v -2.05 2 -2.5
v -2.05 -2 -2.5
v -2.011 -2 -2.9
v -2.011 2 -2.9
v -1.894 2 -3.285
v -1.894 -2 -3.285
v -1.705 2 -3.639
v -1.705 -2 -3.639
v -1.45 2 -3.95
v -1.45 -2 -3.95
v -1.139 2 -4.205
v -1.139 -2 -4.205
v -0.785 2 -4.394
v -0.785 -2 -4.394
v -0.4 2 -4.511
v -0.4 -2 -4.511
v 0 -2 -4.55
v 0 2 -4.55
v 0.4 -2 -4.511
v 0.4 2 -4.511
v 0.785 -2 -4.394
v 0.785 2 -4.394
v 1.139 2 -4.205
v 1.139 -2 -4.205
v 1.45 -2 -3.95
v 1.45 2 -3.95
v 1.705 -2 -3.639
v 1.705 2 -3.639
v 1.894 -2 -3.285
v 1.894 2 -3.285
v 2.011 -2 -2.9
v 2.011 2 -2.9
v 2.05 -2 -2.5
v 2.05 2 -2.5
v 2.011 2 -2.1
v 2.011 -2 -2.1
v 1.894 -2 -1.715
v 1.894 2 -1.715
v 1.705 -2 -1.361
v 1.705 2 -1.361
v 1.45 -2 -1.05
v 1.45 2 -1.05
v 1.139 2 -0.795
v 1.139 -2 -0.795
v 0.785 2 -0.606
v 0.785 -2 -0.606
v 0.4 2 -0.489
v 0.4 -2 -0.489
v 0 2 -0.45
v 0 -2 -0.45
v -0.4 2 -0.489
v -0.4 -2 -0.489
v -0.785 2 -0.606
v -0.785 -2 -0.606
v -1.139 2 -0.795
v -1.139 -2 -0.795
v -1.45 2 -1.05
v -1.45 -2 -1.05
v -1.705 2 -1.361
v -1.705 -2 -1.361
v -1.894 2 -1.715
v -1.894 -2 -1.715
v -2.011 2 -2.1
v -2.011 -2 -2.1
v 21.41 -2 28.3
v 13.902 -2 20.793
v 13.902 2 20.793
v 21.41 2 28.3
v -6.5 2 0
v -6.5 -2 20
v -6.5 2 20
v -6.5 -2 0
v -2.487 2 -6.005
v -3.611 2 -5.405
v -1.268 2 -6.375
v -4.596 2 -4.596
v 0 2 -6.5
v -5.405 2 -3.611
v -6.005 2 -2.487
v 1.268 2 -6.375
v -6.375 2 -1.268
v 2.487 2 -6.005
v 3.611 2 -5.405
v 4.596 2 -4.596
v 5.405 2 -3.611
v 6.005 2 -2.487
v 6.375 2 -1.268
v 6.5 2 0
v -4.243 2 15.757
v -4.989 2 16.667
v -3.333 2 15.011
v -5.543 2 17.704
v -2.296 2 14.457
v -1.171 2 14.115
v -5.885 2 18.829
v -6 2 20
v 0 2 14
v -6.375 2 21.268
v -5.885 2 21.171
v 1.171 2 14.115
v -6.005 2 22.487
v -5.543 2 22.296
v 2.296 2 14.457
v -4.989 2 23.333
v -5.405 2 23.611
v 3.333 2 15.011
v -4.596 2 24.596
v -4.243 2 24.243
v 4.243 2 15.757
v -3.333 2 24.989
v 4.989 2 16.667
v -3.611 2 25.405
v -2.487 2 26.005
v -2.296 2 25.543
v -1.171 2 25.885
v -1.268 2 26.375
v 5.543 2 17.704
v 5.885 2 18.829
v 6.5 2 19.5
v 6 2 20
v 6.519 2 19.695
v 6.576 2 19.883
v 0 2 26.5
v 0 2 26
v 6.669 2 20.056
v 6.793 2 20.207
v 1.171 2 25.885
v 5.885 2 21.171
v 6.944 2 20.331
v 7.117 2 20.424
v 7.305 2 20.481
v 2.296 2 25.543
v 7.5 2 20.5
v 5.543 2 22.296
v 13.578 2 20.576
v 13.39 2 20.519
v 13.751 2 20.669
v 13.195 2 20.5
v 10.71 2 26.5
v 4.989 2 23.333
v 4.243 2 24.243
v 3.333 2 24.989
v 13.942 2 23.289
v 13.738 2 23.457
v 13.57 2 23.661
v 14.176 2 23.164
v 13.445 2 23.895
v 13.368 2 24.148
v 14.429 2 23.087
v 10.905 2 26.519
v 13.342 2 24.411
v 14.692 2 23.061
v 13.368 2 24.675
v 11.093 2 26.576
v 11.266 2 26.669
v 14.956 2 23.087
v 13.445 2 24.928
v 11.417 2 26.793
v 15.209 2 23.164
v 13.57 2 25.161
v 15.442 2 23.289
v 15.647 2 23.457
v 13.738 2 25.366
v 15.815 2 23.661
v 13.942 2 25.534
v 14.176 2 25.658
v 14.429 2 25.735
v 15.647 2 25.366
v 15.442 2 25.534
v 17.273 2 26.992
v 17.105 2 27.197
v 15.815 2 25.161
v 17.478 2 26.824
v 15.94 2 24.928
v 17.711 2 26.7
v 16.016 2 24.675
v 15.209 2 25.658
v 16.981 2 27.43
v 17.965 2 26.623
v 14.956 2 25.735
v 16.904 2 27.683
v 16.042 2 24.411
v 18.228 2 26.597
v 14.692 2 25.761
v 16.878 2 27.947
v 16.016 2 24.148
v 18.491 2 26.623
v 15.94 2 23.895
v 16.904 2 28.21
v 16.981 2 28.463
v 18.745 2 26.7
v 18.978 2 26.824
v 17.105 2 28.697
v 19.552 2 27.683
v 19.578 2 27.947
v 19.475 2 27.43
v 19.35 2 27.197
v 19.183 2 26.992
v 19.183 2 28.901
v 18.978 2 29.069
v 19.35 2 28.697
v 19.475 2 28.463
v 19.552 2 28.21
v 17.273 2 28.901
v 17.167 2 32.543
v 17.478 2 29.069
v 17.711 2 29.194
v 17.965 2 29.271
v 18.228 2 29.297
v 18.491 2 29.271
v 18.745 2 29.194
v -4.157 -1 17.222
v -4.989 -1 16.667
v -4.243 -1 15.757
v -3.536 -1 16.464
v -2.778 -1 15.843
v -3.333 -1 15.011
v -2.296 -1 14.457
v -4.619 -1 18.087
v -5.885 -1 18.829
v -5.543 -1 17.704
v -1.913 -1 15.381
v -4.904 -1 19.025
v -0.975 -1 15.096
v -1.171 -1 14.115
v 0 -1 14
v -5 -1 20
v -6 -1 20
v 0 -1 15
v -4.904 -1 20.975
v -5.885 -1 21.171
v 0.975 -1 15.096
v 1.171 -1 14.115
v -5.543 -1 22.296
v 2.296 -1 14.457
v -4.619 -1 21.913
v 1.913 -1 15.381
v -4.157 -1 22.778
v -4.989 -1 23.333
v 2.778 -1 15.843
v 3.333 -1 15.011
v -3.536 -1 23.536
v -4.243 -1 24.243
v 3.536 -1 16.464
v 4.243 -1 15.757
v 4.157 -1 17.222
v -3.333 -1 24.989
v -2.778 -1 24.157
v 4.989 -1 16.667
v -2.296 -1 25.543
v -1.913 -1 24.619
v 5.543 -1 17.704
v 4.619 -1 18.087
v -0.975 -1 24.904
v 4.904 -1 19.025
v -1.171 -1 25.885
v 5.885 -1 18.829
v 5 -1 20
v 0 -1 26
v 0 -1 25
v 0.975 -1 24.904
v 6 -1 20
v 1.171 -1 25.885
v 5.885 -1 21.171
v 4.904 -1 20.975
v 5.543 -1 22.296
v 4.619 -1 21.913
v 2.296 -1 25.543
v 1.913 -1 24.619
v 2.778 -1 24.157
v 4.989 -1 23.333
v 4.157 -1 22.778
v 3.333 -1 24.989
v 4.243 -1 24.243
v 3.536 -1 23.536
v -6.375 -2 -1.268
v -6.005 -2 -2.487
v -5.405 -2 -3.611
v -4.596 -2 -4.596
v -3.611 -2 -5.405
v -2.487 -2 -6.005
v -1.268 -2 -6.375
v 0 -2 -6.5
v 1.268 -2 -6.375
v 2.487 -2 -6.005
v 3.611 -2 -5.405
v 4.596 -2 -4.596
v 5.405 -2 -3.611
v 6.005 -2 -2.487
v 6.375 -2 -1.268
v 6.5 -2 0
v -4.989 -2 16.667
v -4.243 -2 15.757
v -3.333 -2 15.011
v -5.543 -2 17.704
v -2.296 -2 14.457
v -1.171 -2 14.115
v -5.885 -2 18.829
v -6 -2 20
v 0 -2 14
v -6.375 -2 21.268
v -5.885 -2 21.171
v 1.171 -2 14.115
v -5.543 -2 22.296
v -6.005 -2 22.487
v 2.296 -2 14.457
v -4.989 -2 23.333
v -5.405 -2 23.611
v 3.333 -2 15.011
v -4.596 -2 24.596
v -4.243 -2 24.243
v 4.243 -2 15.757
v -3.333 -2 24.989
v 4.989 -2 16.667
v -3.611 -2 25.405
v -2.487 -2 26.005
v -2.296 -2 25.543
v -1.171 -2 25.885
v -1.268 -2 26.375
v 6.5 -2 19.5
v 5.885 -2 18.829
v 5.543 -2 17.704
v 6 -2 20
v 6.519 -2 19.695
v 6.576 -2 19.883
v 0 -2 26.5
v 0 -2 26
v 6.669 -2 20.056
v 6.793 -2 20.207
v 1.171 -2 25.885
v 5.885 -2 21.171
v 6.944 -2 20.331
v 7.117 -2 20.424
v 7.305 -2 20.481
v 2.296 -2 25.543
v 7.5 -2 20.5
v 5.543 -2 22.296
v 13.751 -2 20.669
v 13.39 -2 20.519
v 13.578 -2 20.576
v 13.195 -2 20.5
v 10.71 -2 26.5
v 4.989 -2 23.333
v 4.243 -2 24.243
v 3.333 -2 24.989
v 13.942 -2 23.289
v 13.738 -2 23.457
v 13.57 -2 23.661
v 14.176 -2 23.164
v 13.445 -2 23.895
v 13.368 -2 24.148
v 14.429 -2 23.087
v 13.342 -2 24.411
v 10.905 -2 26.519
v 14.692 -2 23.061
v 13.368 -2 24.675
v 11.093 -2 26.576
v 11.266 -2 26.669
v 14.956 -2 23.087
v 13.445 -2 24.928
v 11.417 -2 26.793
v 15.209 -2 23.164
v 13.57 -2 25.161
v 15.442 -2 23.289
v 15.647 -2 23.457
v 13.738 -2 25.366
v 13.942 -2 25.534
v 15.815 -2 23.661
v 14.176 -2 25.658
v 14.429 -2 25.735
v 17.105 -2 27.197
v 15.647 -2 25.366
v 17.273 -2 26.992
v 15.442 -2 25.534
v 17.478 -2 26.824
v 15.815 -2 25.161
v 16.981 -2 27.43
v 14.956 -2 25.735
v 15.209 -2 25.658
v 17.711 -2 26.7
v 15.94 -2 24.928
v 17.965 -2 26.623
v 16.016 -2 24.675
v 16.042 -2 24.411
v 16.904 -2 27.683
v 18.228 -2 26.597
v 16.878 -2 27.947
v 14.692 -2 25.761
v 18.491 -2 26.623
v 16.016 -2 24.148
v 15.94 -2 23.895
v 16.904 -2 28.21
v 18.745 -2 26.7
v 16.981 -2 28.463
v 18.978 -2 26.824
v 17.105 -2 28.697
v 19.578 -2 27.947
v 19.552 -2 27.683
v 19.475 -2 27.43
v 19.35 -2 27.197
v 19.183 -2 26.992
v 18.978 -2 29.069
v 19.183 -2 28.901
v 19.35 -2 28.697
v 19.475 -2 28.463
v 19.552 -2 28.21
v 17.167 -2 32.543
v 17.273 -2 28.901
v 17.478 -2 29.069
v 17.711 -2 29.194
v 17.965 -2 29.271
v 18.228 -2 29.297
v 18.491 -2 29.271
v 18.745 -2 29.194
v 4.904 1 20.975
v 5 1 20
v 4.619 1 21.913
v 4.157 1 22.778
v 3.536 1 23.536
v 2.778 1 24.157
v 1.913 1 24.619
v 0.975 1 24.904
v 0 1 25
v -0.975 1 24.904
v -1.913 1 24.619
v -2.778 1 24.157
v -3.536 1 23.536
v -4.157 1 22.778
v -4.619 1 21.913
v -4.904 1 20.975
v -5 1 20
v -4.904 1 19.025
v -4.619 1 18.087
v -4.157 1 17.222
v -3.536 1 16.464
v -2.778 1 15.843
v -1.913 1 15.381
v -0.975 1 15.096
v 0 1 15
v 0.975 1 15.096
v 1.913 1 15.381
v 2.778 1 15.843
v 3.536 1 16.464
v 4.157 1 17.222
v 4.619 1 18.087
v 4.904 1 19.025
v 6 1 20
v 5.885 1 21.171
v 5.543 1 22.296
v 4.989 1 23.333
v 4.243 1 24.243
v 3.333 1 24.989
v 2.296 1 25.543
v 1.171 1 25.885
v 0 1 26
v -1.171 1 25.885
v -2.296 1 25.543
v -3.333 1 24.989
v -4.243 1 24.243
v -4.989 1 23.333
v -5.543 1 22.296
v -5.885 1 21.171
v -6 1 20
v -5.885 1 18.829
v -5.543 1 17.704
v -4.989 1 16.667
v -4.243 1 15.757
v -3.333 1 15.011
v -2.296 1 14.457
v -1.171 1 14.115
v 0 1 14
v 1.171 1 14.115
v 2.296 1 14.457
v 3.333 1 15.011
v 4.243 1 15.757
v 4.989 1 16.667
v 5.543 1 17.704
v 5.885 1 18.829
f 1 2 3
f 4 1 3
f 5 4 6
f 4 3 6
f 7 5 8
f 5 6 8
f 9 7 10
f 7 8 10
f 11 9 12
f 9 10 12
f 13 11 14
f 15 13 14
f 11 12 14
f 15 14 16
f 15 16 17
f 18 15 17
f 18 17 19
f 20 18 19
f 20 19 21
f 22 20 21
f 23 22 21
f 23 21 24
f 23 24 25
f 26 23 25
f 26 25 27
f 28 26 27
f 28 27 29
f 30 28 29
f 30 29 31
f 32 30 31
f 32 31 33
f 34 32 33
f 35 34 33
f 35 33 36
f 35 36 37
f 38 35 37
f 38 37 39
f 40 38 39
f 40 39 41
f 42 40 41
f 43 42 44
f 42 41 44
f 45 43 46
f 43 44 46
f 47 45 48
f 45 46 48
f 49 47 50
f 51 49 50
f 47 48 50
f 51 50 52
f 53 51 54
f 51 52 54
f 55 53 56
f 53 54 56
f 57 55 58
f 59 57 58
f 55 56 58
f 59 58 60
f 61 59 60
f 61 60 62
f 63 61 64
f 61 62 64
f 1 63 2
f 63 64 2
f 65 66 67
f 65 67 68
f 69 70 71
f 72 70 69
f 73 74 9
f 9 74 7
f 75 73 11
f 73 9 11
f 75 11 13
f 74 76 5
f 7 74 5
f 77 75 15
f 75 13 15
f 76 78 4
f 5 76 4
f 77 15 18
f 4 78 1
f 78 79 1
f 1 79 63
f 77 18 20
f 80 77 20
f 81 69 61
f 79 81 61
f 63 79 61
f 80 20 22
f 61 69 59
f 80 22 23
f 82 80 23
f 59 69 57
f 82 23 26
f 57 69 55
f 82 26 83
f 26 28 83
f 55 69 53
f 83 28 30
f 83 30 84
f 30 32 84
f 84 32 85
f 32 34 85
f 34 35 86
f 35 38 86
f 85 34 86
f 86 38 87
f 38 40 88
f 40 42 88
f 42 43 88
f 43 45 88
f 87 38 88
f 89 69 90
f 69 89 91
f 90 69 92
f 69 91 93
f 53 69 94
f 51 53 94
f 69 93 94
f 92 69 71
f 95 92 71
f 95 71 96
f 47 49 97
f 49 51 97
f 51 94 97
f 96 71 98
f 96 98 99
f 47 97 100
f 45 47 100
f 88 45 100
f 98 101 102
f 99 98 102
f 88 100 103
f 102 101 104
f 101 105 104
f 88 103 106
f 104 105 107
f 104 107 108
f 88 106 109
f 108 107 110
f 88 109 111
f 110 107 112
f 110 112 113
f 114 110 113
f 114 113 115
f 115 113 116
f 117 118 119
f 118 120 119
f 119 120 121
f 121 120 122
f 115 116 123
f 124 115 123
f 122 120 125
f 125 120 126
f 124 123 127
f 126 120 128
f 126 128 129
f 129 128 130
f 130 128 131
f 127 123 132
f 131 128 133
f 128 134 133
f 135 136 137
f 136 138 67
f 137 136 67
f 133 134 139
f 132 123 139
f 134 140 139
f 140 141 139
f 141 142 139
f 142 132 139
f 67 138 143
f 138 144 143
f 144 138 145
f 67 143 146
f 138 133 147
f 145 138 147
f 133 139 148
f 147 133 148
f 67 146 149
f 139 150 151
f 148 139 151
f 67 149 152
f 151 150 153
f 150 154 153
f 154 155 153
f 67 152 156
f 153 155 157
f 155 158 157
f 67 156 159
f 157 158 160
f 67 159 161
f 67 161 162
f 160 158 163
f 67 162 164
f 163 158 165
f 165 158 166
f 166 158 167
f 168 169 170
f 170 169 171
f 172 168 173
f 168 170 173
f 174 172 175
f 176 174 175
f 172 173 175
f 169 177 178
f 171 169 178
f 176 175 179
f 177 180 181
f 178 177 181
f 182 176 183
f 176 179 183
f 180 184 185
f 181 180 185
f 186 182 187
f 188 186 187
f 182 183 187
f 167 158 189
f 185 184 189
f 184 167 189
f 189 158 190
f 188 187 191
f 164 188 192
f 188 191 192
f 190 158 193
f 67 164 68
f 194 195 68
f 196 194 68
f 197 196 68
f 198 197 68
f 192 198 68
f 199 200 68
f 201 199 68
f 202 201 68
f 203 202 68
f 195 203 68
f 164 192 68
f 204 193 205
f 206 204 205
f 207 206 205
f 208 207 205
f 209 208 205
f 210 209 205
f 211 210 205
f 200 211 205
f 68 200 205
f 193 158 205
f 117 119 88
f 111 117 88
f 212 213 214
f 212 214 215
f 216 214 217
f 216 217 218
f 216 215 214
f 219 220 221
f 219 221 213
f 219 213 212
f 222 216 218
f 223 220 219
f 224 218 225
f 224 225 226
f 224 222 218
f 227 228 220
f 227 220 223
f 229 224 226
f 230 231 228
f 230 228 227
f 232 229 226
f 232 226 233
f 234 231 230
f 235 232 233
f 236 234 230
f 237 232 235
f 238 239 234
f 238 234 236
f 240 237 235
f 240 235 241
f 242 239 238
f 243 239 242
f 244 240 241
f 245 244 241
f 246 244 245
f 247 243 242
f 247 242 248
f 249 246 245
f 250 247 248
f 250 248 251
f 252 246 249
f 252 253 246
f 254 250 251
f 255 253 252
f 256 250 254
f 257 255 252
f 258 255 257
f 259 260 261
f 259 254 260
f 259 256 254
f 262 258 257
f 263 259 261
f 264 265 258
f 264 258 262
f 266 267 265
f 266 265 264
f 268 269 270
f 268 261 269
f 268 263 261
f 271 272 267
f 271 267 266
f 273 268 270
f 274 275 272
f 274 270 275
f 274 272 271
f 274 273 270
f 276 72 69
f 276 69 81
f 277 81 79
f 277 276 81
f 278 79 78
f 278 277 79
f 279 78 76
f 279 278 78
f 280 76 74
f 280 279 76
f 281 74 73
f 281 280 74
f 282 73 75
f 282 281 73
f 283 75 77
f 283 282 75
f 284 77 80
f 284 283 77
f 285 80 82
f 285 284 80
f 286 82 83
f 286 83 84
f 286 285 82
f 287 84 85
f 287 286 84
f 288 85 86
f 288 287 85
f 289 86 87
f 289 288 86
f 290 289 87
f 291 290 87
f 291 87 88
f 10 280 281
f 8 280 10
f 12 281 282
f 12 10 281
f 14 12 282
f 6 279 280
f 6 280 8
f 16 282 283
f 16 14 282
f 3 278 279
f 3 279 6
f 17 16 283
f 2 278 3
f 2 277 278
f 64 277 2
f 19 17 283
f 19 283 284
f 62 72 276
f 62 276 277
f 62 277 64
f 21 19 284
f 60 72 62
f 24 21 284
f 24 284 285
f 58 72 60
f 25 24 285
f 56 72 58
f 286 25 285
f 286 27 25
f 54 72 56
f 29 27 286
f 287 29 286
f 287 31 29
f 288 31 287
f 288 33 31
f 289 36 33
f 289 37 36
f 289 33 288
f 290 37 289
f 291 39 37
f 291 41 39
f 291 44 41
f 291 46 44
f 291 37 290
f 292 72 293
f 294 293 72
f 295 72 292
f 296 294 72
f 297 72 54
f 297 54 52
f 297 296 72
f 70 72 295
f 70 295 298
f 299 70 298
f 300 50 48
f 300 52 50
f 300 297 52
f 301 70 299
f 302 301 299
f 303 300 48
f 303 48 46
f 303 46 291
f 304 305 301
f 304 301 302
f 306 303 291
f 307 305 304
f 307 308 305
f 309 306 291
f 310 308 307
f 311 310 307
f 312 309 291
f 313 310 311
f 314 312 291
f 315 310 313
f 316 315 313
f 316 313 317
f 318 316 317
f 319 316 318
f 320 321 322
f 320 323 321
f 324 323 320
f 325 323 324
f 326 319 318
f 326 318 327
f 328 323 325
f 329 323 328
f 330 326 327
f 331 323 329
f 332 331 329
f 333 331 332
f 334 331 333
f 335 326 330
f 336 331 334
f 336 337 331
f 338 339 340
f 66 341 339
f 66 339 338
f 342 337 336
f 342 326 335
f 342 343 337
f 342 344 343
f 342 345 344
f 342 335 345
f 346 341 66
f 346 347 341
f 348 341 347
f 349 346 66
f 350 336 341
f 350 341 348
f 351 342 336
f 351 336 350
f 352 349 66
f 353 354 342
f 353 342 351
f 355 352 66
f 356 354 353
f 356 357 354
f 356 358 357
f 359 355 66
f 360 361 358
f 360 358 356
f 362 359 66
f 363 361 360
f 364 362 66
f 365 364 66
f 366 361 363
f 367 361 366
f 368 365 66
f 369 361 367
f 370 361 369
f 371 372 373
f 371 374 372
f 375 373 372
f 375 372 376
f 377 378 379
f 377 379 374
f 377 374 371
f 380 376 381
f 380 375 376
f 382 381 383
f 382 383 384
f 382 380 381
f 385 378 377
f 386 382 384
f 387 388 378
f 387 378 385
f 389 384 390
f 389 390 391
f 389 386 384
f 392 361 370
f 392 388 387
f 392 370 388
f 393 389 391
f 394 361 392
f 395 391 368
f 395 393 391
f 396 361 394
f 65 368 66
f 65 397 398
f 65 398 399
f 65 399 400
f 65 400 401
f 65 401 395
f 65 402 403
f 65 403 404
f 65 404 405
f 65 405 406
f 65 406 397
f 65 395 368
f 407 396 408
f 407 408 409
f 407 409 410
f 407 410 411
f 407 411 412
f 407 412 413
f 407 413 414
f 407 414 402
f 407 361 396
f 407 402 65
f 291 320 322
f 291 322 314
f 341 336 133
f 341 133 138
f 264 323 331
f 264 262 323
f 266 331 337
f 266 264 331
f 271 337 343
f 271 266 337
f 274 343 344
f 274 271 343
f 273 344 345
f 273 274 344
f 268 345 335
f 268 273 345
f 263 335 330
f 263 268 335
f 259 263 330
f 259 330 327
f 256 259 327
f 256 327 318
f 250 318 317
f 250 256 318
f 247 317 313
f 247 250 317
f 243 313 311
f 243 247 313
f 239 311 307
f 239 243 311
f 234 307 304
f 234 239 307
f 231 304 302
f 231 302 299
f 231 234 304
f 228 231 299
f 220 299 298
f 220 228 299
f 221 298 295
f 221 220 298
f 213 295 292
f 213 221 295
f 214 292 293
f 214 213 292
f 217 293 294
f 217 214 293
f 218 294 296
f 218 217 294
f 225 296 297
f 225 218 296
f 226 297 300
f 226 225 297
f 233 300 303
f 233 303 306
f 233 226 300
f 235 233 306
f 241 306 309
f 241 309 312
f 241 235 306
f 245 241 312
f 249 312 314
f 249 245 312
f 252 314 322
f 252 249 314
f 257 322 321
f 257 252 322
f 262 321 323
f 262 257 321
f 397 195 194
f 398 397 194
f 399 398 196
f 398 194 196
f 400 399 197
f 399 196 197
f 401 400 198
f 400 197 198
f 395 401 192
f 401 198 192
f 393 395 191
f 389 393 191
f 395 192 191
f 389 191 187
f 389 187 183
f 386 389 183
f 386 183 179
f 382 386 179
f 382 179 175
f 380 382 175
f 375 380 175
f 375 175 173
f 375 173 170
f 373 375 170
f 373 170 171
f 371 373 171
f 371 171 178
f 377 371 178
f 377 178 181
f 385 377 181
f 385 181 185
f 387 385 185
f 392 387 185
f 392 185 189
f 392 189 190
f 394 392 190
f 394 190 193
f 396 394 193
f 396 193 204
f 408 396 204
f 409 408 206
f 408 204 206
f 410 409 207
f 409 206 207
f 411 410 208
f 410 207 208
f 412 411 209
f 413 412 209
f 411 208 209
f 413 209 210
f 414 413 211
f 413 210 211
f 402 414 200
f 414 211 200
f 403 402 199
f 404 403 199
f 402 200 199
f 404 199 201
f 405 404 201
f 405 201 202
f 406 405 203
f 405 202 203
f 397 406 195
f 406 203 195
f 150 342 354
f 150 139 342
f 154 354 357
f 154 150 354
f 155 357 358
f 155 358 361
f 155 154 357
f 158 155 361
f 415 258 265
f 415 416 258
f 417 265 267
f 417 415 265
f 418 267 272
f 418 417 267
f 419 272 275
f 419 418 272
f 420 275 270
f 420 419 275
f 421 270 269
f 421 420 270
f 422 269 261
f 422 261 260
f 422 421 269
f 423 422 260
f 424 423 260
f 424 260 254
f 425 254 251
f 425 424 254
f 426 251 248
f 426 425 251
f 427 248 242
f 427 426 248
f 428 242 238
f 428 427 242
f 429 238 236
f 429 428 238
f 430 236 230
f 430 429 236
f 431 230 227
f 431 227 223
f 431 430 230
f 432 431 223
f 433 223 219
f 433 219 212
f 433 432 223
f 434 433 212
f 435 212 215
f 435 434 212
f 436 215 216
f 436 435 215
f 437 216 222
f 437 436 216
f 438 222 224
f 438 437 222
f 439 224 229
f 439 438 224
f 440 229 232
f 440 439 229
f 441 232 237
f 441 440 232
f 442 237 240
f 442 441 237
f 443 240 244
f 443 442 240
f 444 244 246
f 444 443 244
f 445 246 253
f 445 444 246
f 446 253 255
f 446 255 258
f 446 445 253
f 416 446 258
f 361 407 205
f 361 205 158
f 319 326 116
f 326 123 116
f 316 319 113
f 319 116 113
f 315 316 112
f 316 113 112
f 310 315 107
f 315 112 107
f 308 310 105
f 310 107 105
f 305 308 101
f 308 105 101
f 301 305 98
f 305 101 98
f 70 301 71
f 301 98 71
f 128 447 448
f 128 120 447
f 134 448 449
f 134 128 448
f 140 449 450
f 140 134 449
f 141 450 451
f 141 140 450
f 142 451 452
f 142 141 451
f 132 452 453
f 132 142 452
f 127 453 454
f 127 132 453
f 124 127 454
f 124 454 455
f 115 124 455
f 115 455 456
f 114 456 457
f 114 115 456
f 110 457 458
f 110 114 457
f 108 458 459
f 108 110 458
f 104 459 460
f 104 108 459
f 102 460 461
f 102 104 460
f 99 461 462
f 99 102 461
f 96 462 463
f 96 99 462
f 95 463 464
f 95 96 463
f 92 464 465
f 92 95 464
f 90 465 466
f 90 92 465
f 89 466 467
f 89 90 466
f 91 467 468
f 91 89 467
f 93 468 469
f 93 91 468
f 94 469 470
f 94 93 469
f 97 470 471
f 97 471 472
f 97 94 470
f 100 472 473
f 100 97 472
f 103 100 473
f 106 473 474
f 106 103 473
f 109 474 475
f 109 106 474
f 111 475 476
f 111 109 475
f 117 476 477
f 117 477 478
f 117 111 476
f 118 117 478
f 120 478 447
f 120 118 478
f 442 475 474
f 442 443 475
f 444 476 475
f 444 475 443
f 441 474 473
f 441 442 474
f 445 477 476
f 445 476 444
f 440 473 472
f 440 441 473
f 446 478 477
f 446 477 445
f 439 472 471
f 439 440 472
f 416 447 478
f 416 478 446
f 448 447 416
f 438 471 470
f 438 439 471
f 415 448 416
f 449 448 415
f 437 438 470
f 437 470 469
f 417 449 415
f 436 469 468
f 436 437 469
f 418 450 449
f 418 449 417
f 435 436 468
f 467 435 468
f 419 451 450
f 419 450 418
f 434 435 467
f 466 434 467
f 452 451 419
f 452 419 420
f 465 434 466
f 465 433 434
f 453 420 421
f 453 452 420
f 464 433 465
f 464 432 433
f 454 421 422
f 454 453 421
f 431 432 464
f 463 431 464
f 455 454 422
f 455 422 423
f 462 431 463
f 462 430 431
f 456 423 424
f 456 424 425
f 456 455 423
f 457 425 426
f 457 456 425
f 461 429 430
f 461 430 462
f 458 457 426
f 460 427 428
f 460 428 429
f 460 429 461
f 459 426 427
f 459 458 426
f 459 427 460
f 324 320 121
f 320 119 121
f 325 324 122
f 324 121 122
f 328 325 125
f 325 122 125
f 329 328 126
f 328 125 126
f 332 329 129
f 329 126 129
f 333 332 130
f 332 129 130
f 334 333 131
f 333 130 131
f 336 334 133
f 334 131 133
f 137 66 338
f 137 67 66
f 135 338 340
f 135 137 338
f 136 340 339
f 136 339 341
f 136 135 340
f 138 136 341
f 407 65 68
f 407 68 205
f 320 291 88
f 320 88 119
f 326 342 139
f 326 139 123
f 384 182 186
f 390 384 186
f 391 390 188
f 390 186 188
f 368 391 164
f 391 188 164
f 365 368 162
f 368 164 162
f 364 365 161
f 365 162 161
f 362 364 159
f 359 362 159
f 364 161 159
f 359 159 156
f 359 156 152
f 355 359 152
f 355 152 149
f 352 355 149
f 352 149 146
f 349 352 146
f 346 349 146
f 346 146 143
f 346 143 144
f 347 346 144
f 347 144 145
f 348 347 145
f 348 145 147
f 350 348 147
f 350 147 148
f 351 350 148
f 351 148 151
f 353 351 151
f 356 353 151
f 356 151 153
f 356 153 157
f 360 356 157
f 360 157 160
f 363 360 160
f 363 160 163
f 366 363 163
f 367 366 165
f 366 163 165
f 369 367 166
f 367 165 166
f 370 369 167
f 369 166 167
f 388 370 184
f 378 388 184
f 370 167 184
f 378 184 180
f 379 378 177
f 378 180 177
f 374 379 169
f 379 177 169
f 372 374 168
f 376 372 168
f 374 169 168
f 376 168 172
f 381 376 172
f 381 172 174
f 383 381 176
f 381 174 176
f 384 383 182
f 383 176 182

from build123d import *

# Parameters (mm, degrees)
BOSS_EXTRUDE1_DEPTH            = 4
DRAFT1_ANGLE                   = 45.000000004
DRAFT2_ANGLE                   = 45.000000005
F_4_1_4_1_DIAMETER_HOLE1_D     = 4.1
F_4_1_4_1_DIAMETER_HOLE1_DEPTH = 4
F_2_7_2_7_DIAMETER_HOLE1_D     = 2.7
F_2_7_2_7_DIAMETER_HOLE1_DEPTH = 4
FILLET1_R                      = 1
FILLET2_R                      = 6.5


with BuildPart() as part:
    # Sketch1 → Boss-Extrude1 (new body)
    with BuildSketch(Plane.XZ.offset(2)):
        with BuildLine():
            Line((11.124319466, 26.5), (-6.5, 26.5))
            Line((-6.5, 26.5), (-6.5, 0))
            ThreePointArc((-6.5, 0), (3e-09, -6.500000003), (6.500000005, 0))
            Line((6.500000005, 0), (6.500000005, 20.5))
            Line((6.500000005, 20.5), (13.60960084, 20.5))
            Line((13.60960084, 20.5), (13.60960084, 36.100603473))
            Line((13.60960084, 36.100603473), (11.124319466, 38.585884847))
            Line((11.124319466, 38.585884847), (11.124319466, 26.5))
        make_face()
    extrude(amount=-BOSS_EXTRUDE1_DEPTH)

    # Draft1
    draft1_faces = [part.faces().sort_by_distance(p)[0] for p in [
        (13.60960084, 0, 28.300301737),
    ]]
    draft(draft1_faces, Plane(origin=(6.500000005, 2, 20.5), x_dir=(-1, 0, 0), z_dir=(0, 0, -1)), DRAFT1_ANGLE)

    # Draft2
    draft2_faces = [part.faces().sort_by_distance(p)[0] for p in [
        (11.124319466, 0, 32.542942424),
    ]]
    draft(draft2_faces, Plane(origin=(11.124319466, 2, 26.5), x_dir=(1, 0, 0), z_dir=(0, 0, 1)), DRAFT2_ANGLE)

    # Sketch2 → Cut-Revolve1 (revolve, cut)
    with BuildSketch(Plane.XY.offset(20)):
        Polygon((6, 2), (0, 2), (0, -2), (6, -2), (6, -1), (5, -1), (5, 1), (6, 1), align=None)
    revolve(axis=Axis((0, 2, 20), (0, -1, 0)), mode=Mode.SUBTRACT)

    # Ø4.1 (4.1) Diameter Hole1
    with Locations(Plane(origin=(0, 2, 0), x_dir=(1, 0, 0), z_dir=(0, 1, 0))):
        with Locations((0, 2.5)):
            Hole(F_4_1_4_1_DIAMETER_HOLE1_D / 2, depth=F_4_1_4_1_DIAMETER_HOLE1_DEPTH)

    # Ø2.7 (2.7) Diameter Hole1
    with Locations(Plane(origin=(0, -2, 0), x_dir=(-1, 0, 0), z_dir=(0, -1, 0))):
        with Locations((-14.692388155, -24.41121444), (-18.227922061, -27.946748346)):
            Hole(F_2_7_2_7_DIAMETER_HOLE1_D / 2, depth=F_2_7_2_7_DIAMETER_HOLE1_DEPTH)

    # Fillet1
    fillet1_edges = [part.edges().sort_by_distance(p)[0] for p in [
        (13.60960084, 0, 20.5),
        (6.500000005, 0, 20.5),
        (11.124319466, 0, 26.5),
    ]]
    fillet(fillet1_edges, radius=FILLET1_R)

    # Fillet2
    fillet2_edges = [part.edges().sort_by_distance(p)[0] for p in [
        (-6.5, 0, 26.5),
    ]]
    fillet(fillet2_edges, radius=FILLET2_R)


solid = part.part
